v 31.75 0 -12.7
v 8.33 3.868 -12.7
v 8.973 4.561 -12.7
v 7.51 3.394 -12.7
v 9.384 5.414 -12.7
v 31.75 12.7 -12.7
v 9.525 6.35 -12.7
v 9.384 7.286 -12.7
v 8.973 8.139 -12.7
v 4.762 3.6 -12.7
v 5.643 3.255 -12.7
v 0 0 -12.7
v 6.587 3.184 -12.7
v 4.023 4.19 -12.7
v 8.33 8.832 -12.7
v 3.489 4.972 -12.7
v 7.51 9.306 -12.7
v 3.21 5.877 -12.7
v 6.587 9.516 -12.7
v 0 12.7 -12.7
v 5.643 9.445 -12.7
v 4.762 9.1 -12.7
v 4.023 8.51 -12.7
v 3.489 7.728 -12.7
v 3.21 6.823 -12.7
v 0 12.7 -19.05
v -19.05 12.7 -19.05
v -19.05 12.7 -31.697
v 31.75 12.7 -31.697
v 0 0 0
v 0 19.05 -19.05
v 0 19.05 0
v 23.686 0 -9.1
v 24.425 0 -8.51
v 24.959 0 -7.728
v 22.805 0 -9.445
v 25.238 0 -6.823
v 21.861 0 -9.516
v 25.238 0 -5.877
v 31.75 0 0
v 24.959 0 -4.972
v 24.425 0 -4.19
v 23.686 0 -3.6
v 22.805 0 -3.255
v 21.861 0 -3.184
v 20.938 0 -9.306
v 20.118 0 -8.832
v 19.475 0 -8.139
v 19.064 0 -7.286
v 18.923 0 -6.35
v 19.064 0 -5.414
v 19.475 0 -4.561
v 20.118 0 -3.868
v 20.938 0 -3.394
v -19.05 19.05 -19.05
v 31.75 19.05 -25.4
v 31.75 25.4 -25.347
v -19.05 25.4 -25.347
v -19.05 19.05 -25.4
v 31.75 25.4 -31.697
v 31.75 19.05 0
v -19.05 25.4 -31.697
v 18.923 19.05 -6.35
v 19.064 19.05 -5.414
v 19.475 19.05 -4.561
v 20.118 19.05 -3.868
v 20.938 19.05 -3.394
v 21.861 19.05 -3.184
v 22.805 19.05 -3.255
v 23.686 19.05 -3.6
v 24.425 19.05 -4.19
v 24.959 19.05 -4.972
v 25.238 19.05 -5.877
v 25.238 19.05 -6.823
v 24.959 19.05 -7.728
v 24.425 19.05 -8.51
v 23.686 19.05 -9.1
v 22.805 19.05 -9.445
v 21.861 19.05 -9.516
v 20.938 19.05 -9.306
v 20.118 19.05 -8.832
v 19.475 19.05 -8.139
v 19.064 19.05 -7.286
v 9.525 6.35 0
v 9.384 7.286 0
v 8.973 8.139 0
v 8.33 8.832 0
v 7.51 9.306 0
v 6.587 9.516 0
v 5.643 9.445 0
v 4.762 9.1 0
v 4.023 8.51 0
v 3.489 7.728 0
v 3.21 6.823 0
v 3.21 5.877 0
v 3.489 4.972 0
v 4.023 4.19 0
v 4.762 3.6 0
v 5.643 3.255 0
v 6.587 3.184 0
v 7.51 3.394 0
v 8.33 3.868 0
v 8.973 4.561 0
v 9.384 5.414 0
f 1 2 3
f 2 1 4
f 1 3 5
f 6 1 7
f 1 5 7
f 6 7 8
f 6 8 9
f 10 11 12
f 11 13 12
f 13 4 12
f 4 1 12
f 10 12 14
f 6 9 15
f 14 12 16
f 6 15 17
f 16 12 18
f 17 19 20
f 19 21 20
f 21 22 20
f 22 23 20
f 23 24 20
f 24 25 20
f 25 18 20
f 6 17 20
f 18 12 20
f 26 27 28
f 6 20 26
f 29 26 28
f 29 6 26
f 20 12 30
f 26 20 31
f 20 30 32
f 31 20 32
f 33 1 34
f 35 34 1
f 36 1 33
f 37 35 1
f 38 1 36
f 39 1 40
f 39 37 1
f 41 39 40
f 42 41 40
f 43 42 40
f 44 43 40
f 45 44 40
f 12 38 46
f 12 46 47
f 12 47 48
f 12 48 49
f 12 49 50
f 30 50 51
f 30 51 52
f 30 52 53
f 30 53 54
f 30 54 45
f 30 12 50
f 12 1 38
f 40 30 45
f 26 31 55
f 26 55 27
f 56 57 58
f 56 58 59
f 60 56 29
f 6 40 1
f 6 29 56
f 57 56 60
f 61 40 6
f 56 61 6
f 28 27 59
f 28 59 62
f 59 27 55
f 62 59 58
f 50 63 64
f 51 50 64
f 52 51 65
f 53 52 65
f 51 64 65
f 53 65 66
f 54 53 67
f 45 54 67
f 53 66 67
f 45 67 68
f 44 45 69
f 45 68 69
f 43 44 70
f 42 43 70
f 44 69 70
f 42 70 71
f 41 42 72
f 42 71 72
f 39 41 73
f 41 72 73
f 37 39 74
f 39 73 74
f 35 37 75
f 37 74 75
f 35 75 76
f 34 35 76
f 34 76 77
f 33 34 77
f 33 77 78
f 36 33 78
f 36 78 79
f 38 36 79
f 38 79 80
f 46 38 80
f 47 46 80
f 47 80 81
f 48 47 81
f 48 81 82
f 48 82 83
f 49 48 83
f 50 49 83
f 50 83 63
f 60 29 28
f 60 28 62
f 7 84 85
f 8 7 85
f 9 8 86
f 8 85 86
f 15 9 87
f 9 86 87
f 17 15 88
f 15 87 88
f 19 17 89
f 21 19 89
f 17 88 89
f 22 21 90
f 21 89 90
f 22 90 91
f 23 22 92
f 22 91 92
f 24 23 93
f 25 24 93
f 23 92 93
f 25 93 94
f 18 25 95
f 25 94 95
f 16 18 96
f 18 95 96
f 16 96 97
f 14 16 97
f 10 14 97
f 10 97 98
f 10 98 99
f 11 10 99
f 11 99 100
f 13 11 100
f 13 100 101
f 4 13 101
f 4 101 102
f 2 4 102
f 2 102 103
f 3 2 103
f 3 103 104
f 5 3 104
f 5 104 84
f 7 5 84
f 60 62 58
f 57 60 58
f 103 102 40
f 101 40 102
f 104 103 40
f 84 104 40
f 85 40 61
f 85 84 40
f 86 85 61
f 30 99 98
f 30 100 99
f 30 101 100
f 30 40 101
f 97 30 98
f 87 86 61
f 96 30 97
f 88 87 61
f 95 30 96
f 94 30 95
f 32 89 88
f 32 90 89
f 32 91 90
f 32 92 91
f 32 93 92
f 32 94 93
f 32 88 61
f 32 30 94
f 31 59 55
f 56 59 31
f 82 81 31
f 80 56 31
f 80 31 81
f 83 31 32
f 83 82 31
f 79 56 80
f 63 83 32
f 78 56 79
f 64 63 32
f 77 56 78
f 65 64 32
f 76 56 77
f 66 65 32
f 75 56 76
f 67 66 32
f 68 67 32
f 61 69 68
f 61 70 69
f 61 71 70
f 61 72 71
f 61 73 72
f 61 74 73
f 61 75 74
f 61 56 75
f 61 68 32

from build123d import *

# Parameters (mm, degrees)
F0_W     = 19.05
F0_H     = 12.7
F1_DEPTH = 31.75
F2_W     = 6.35
F2_H     = 6.35
F3_DEPTH = 31.75
F5_DEPTH = 50.8
F6_R     = 3.175
F7_DEPTH = 31.697754
F8_R     = 3.175
F9_DEPTH = 25.4


with BuildPart() as f1:
    # F0 (on Right) → F1 (new body)
    with BuildSketch(Plane.YZ):
        with Locations((9.525, -6.35)):
            Rectangle(F0_W, F0_H)
    extrude(amount=F1_DEPTH)

    # F2 (on face) → F3 (join)
    with BuildSketch(Plane.YZ.offset(31.75)):
        with Locations((15.875, -15.875)):
            Rectangle(F2_W, F2_H)
    extrude(amount=-F3_DEPTH)

    # F4 (on face) → F5 (join)
    with BuildSketch(Plane.YZ.offset(31.75)):
        Polygon((19.05, -19.05), (12.7, -19.05), (12.7, -31.696754), (25.4, -31.696754), (25.4, -25.346754), (19.05, -25.4), align=None)
    extrude(amount=-F5_DEPTH)

    # F6 (on face) → F7 (cut, through all)
    with BuildSketch(Plane.XY):
        with Locations((6.35, 6.35)):
            Circle(F6_R)
    extrude(amount=-F7_DEPTH, mode=Mode.SUBTRACT)

    # F8 (on face) → F9 (cut)
    with BuildSketch(Plane(origin=(0, 19.05, 0), x_dir=(-1, 0, 0), z_dir=(0, 1, 0))):
        with Locations((-22.098, -6.35)):
            Circle(F8_R)
    extrude(amount=-F9_DEPTH, mode=Mode.SUBTRACT)


solid = f1.part
